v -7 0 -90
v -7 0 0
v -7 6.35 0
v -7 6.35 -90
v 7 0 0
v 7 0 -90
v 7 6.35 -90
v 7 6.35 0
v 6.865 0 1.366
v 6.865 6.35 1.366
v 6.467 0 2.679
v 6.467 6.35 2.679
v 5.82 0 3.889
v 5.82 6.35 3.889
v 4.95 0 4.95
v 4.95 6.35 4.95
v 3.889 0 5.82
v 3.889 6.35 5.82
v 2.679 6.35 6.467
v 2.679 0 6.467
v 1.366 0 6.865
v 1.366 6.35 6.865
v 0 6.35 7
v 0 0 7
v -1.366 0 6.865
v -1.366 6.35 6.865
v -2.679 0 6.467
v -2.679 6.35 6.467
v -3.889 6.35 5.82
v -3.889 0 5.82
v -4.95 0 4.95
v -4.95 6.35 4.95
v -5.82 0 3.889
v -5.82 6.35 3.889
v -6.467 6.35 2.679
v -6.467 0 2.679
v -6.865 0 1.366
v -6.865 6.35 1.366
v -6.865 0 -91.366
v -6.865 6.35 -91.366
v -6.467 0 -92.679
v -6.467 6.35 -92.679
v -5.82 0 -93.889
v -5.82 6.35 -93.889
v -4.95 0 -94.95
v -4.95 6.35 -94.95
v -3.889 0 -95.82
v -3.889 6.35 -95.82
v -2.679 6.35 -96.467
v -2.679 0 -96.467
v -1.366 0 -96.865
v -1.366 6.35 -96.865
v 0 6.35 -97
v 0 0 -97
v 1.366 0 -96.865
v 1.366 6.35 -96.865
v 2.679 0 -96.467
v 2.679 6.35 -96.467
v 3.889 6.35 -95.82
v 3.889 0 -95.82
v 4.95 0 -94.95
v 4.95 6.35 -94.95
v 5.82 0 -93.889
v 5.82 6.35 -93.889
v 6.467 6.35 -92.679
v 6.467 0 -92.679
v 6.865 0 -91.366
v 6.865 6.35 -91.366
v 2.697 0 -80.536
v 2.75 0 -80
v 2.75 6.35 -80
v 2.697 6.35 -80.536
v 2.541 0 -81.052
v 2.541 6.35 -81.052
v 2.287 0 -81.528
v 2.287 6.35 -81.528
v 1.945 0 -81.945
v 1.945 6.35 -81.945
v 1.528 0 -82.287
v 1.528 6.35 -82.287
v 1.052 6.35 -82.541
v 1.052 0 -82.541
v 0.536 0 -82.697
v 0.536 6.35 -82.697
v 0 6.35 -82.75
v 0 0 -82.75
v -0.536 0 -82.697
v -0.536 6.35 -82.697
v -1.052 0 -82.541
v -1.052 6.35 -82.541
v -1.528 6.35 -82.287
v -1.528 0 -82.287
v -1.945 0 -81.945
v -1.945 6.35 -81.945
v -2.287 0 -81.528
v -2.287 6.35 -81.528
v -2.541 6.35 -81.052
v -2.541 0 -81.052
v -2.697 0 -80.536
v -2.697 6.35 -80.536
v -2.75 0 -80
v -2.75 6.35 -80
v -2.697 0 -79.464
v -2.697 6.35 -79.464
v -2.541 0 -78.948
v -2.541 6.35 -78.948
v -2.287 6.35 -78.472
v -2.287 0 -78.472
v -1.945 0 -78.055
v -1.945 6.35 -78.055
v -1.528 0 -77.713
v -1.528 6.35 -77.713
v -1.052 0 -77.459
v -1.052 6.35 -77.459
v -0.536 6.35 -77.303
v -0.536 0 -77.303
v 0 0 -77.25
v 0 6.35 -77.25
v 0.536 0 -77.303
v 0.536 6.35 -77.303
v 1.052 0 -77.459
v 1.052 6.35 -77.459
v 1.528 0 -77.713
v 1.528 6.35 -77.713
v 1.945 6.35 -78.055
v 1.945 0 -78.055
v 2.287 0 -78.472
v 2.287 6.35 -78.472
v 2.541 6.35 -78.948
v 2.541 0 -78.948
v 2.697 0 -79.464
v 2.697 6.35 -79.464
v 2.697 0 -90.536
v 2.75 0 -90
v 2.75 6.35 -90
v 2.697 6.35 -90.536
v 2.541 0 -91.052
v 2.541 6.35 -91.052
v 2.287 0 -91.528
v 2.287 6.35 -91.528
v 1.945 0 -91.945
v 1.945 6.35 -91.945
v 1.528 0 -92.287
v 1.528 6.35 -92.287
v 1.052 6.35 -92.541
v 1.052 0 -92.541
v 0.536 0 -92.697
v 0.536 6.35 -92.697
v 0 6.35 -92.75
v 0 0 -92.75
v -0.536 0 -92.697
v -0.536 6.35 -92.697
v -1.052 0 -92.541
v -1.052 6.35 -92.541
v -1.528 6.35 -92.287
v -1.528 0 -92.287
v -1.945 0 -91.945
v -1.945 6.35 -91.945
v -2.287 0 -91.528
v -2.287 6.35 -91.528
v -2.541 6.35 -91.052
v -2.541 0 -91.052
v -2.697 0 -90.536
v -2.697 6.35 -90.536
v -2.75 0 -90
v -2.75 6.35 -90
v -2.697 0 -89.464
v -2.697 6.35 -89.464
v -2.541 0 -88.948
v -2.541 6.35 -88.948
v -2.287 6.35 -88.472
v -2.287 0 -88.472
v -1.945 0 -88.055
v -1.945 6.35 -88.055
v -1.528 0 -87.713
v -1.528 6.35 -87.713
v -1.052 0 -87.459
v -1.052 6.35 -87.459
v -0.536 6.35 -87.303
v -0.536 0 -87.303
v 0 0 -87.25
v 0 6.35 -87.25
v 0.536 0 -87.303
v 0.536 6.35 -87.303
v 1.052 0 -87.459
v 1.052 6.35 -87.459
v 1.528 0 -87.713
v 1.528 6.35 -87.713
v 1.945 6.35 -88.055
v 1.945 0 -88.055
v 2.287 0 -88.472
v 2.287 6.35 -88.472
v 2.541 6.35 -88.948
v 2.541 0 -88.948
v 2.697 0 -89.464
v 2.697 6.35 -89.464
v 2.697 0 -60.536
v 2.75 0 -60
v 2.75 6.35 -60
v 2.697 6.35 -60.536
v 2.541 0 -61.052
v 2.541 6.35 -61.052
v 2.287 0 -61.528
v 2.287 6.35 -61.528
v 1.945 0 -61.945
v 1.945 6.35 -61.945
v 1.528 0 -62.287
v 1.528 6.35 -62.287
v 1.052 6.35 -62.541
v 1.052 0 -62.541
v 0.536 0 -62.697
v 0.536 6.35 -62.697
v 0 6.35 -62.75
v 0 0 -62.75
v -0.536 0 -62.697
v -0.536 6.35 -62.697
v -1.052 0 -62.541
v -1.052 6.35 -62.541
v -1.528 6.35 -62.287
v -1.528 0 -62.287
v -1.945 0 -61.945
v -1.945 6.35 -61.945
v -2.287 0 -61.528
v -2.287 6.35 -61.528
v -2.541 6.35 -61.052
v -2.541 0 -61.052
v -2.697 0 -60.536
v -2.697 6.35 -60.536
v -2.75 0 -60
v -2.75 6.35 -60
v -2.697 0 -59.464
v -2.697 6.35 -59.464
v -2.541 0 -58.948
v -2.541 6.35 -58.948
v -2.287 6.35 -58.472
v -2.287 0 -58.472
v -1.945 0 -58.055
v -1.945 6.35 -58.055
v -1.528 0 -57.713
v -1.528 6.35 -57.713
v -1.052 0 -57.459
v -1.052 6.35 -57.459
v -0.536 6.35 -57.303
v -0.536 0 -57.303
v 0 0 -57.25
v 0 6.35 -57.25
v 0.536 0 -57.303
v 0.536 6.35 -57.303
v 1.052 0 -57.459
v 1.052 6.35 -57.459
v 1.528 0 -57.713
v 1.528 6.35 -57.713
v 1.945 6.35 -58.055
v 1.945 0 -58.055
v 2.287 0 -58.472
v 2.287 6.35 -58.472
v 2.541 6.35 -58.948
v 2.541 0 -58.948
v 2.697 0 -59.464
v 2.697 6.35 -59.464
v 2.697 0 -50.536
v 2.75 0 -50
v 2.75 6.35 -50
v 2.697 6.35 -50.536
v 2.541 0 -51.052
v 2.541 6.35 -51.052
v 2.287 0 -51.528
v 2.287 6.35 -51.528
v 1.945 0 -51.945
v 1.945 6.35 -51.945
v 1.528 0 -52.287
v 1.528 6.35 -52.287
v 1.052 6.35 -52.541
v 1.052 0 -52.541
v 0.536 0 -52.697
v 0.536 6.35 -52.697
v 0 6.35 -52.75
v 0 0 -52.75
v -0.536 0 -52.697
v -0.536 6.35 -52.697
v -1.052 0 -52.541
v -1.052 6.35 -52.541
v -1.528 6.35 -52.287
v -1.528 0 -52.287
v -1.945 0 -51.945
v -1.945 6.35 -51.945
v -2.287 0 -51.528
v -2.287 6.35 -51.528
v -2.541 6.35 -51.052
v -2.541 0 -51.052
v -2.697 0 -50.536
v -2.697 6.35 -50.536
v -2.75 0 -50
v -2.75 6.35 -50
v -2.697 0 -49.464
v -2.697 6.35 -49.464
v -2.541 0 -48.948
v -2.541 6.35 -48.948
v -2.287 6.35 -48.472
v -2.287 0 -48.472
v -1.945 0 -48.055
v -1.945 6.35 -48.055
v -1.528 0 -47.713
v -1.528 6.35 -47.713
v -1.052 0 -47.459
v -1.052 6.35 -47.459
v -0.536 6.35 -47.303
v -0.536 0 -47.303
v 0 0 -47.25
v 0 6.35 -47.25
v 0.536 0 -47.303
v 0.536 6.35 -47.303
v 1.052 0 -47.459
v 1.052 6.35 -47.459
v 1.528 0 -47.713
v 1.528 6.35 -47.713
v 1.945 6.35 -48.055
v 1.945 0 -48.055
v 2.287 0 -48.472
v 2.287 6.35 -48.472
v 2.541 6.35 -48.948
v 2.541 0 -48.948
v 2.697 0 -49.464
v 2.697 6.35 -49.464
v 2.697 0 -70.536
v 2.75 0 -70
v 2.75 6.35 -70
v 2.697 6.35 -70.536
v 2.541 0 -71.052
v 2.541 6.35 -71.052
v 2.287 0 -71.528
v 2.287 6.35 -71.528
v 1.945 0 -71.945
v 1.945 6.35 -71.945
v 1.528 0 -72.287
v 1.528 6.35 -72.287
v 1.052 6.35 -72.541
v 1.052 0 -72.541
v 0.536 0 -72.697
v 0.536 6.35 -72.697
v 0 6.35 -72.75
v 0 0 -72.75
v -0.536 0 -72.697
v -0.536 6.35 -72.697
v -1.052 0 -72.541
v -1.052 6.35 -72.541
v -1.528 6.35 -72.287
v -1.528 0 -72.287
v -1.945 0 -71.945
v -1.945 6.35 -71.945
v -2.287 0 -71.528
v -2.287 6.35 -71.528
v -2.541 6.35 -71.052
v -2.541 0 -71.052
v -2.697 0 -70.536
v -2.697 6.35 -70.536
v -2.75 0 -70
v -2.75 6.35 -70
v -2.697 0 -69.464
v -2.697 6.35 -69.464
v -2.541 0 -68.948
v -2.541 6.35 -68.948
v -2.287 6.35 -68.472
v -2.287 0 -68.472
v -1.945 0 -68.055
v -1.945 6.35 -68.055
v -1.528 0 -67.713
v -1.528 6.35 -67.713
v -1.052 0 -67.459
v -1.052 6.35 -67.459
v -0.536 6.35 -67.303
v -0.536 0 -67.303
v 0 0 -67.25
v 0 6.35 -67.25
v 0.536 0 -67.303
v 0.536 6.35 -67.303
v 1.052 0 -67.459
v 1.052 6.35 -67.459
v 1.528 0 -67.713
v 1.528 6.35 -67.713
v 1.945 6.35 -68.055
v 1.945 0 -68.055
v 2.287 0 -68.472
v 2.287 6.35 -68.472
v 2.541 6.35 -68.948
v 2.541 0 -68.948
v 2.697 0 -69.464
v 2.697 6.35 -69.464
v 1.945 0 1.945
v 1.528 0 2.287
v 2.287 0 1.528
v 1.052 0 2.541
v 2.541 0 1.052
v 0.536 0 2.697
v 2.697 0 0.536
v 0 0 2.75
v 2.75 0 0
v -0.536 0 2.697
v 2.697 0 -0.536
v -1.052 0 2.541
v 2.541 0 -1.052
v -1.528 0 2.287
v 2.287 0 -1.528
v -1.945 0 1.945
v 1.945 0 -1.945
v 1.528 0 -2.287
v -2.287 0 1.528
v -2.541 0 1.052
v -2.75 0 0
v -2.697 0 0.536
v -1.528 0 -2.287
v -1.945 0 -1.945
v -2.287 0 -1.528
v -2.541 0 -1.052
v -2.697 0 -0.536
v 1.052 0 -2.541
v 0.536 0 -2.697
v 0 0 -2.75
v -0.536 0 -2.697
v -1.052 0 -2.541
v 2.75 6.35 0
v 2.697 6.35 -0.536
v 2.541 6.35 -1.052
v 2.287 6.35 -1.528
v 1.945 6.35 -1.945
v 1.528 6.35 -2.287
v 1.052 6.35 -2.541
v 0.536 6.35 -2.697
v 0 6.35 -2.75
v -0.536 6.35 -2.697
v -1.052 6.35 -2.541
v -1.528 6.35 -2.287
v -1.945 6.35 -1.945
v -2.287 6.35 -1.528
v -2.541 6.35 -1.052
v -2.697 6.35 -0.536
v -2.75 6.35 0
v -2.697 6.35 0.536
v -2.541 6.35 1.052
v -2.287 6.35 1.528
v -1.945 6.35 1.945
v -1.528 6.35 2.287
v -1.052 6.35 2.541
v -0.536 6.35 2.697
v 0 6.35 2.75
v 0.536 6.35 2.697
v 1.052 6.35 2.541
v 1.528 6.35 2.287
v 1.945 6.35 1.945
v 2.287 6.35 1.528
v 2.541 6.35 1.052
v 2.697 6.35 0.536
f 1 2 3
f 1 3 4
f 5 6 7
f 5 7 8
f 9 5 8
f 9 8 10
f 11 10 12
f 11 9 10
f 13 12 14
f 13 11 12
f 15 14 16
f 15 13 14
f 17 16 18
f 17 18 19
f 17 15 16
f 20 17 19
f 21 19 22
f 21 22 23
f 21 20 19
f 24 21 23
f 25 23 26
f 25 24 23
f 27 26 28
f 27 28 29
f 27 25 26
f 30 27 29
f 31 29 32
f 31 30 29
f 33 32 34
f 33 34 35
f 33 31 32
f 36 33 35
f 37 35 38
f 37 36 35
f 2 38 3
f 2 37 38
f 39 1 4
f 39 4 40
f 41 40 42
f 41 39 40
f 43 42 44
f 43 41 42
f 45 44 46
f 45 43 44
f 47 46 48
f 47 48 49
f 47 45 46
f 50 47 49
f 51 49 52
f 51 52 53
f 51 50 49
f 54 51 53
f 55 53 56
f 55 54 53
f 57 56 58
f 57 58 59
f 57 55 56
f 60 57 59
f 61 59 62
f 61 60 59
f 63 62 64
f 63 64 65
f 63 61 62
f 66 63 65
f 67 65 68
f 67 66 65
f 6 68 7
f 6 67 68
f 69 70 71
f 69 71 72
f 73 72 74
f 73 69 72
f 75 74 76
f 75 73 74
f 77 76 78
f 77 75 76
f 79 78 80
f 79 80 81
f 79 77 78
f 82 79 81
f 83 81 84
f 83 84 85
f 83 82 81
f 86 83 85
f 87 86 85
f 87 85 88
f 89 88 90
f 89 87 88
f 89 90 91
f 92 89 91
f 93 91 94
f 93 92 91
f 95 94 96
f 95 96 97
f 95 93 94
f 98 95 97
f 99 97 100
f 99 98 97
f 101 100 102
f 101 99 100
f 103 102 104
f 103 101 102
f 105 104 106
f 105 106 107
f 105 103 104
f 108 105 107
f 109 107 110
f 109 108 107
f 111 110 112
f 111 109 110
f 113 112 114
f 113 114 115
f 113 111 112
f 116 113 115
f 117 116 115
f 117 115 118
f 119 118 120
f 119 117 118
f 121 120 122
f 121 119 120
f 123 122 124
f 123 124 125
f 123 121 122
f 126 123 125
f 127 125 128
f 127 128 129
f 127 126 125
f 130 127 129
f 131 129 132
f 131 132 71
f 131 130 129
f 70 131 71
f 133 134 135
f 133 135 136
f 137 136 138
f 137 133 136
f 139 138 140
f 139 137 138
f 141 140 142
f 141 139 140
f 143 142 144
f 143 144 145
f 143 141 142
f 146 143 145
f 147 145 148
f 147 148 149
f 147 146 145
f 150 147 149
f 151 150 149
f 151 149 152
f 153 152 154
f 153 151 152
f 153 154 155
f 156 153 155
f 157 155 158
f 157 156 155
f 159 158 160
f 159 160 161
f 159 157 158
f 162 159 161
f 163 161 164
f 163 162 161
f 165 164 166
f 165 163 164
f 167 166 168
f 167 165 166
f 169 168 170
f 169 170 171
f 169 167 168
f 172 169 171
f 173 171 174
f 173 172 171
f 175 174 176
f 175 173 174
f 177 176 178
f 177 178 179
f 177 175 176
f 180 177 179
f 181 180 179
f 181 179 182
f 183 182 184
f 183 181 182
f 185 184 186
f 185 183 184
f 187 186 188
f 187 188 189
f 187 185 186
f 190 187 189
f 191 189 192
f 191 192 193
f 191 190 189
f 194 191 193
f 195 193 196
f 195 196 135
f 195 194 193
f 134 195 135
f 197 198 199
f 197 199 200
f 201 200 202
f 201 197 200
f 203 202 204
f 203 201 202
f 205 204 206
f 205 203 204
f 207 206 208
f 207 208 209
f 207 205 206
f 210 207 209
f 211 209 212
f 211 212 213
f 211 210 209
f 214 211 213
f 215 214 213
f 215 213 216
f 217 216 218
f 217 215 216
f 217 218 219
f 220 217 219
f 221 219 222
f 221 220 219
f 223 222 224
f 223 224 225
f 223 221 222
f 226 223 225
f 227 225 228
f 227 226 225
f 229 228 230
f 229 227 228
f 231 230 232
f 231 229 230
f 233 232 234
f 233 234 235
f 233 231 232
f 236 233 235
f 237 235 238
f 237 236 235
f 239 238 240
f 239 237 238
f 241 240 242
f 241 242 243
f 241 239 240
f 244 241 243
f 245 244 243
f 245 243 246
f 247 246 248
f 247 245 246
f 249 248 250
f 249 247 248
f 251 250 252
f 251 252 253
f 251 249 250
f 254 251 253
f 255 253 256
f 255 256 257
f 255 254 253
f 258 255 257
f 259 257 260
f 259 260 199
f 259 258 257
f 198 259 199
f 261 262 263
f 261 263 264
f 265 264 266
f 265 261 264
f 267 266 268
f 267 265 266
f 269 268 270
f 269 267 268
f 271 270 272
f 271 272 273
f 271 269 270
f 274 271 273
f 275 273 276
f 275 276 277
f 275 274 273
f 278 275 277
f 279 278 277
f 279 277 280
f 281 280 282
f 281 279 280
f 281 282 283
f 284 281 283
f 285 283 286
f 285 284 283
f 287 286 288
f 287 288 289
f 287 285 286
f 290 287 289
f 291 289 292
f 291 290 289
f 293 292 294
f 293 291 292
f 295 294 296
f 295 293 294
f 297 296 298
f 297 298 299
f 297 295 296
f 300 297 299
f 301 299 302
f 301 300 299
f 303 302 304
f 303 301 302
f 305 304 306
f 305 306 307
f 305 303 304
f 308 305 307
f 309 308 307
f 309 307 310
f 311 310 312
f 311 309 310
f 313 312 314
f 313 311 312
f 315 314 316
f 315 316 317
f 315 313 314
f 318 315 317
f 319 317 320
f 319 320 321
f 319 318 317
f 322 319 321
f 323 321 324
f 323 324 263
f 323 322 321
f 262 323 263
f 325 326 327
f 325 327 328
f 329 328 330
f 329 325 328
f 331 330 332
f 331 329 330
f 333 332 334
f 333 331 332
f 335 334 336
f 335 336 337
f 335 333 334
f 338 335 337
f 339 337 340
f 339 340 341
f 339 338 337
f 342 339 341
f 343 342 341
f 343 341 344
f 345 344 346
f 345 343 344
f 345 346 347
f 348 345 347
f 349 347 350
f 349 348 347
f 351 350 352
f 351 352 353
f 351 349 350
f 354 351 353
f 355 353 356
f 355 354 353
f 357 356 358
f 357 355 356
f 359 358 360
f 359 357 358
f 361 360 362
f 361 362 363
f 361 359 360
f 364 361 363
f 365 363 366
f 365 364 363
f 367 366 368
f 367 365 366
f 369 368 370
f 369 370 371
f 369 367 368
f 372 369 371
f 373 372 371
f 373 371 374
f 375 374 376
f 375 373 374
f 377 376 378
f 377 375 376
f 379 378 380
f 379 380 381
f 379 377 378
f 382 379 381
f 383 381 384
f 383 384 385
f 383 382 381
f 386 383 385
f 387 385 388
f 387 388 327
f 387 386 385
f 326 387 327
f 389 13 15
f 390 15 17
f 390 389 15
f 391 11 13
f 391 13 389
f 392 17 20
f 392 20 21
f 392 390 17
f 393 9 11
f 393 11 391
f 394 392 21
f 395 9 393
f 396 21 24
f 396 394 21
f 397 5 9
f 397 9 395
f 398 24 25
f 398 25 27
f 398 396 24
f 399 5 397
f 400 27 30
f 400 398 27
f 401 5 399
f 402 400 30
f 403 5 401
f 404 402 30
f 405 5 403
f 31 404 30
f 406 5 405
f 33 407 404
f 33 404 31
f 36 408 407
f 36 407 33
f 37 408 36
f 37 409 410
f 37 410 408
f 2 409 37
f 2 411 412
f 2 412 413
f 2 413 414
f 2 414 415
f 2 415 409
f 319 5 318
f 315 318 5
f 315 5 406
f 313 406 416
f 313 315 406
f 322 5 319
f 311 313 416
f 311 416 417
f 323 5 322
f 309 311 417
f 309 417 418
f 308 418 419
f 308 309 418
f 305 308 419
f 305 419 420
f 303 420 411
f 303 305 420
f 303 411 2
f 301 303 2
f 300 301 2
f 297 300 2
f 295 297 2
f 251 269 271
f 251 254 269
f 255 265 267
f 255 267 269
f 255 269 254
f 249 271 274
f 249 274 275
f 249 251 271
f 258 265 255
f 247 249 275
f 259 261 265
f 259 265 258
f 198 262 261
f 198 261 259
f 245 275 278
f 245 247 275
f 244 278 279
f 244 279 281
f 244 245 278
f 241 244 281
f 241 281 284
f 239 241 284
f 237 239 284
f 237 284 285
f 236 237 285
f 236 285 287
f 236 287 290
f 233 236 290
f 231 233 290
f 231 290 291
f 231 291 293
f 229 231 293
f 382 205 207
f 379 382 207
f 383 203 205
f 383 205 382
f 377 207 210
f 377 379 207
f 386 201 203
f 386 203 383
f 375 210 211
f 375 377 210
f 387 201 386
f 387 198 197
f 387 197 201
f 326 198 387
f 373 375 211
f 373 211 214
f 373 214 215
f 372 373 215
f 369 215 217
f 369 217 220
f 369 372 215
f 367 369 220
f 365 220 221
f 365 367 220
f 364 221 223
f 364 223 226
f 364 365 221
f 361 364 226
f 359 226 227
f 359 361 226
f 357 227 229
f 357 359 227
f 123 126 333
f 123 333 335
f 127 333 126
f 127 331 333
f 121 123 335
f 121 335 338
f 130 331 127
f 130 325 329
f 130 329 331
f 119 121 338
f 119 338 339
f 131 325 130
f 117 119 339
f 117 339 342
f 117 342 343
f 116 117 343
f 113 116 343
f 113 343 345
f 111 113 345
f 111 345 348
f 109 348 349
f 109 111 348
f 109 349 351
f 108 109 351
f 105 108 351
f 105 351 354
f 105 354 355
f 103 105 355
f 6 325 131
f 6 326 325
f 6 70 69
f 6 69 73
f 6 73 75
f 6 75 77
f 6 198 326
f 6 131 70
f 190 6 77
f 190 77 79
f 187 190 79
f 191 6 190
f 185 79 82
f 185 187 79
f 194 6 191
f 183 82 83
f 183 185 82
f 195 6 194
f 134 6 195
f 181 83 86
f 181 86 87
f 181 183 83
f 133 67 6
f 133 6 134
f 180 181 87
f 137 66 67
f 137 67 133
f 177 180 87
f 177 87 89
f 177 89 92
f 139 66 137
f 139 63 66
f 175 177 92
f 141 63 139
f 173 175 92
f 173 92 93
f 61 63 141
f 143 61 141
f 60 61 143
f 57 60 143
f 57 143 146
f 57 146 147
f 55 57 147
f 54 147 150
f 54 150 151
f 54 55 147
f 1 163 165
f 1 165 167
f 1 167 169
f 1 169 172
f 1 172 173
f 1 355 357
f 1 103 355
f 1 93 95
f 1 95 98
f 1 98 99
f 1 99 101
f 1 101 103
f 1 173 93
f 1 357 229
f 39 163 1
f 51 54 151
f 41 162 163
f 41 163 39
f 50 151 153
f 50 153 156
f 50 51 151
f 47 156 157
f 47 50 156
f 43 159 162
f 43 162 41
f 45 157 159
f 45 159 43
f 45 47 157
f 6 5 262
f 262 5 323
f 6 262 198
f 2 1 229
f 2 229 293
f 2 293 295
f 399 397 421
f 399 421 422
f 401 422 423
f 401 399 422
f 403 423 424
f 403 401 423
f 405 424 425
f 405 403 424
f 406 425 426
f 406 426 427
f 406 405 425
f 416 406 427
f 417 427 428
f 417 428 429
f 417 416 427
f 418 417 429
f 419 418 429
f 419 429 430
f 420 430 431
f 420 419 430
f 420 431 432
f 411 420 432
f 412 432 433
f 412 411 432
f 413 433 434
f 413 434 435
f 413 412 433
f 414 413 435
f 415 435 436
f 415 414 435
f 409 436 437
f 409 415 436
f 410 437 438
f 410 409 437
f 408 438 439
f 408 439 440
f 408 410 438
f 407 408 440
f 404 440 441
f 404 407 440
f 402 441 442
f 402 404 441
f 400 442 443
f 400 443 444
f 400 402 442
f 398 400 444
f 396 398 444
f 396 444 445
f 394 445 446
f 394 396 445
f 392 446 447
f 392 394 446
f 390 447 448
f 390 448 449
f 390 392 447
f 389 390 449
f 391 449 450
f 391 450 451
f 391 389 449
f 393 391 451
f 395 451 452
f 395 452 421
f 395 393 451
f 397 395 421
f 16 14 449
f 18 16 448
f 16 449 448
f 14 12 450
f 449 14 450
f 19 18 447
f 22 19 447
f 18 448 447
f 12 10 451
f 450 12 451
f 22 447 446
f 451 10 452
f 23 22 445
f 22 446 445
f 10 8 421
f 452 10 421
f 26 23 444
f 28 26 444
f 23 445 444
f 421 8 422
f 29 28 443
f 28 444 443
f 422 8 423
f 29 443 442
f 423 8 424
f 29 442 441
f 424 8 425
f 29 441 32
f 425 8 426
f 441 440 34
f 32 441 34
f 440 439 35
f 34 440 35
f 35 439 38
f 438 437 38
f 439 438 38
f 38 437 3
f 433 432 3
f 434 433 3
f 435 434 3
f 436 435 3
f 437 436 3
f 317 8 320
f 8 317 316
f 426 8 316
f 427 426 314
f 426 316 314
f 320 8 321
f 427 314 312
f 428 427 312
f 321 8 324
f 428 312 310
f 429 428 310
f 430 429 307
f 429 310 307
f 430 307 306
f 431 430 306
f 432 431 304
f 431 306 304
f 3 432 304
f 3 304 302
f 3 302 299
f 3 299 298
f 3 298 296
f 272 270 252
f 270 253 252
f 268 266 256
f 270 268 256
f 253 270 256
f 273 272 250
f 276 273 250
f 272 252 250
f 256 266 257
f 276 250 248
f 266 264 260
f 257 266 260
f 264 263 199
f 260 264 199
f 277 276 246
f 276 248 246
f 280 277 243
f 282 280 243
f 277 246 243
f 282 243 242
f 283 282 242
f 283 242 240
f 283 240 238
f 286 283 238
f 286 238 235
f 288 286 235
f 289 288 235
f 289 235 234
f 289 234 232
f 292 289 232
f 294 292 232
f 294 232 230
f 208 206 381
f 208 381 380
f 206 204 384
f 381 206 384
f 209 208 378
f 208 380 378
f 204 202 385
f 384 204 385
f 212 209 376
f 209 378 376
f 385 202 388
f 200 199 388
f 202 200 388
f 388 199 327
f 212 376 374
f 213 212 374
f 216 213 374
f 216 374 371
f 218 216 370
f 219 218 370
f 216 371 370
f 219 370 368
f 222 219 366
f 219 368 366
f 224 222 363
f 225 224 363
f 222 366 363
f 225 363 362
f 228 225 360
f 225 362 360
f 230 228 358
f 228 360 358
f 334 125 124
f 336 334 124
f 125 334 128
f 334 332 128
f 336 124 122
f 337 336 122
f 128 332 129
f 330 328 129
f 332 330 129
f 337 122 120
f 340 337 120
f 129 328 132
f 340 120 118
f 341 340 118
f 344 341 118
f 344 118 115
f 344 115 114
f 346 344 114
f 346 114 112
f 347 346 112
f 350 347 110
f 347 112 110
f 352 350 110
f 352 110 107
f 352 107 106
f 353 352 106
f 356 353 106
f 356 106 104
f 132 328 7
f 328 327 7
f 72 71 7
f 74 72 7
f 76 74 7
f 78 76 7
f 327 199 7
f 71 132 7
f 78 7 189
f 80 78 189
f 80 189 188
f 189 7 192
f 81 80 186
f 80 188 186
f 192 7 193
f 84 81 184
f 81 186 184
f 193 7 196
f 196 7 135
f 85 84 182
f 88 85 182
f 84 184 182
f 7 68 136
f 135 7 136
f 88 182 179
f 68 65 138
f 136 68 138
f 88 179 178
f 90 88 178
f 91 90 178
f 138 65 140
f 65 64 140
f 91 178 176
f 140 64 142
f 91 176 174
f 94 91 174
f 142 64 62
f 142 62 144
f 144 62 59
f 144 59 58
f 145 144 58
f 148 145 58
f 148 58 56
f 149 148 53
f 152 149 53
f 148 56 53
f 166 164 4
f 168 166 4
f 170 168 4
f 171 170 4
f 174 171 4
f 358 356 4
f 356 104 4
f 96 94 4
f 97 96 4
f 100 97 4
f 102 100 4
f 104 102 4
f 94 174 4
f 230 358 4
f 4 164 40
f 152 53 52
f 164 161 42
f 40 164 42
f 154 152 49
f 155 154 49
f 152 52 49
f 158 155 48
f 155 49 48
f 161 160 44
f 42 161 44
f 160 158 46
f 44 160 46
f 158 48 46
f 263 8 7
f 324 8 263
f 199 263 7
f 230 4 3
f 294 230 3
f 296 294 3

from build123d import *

# Parameters (mm, degrees)
SKETCH1_R           = 2.75
BOSS_EXTRUDE1_DEPTH = 6.35
SKETCH2_R           = 2.75
CUT_EXTRUDE1_DEPTH  = 6.35


with BuildPart() as part:
    # Sketch1 → Boss-Extrude1 (new body)
    with BuildSketch(Plane(origin=(0, 0, 0), x_dir=(1, 0, 0), z_dir=(0, 1, 0))):
        with BuildLine():
            Line((7, 90), (7, 0))
            ThreePointArc((7, 0), (0, -7), (-7, 0))
            Line((-7, 0), (-7, 90))
            ThreePointArc((-7, 90), (0, 97), (7, 90))
        make_face()
        with Locations((0, 90)):
            Circle(SKETCH1_R, mode=Mode.SUBTRACT)
        Circle(SKETCH1_R, mode=Mode.SUBTRACT)
    extrude(amount=BOSS_EXTRUDE1_DEPTH)

    # Sketch2 → Cut-Extrude1 (cut)
    with BuildSketch(Plane(origin=(0, 0, 0), x_dir=(1, 0, 0), z_dir=(0, 1, 0))):
        with Locations((0, 90)):
            Circle(SKETCH2_R)
        with Locations((0, 80)):
            Circle(SKETCH2_R)
        with Locations((0, 70)):
            Circle(SKETCH2_R)
        with Locations((0, 60)):
            Circle(SKETCH2_R)
        with Locations((0, 50)):
            Circle(SKETCH2_R)
    extrude(amount=CUT_EXTRUDE1_DEPTH, mode=Mode.SUBTRACT)


solid = part.part
